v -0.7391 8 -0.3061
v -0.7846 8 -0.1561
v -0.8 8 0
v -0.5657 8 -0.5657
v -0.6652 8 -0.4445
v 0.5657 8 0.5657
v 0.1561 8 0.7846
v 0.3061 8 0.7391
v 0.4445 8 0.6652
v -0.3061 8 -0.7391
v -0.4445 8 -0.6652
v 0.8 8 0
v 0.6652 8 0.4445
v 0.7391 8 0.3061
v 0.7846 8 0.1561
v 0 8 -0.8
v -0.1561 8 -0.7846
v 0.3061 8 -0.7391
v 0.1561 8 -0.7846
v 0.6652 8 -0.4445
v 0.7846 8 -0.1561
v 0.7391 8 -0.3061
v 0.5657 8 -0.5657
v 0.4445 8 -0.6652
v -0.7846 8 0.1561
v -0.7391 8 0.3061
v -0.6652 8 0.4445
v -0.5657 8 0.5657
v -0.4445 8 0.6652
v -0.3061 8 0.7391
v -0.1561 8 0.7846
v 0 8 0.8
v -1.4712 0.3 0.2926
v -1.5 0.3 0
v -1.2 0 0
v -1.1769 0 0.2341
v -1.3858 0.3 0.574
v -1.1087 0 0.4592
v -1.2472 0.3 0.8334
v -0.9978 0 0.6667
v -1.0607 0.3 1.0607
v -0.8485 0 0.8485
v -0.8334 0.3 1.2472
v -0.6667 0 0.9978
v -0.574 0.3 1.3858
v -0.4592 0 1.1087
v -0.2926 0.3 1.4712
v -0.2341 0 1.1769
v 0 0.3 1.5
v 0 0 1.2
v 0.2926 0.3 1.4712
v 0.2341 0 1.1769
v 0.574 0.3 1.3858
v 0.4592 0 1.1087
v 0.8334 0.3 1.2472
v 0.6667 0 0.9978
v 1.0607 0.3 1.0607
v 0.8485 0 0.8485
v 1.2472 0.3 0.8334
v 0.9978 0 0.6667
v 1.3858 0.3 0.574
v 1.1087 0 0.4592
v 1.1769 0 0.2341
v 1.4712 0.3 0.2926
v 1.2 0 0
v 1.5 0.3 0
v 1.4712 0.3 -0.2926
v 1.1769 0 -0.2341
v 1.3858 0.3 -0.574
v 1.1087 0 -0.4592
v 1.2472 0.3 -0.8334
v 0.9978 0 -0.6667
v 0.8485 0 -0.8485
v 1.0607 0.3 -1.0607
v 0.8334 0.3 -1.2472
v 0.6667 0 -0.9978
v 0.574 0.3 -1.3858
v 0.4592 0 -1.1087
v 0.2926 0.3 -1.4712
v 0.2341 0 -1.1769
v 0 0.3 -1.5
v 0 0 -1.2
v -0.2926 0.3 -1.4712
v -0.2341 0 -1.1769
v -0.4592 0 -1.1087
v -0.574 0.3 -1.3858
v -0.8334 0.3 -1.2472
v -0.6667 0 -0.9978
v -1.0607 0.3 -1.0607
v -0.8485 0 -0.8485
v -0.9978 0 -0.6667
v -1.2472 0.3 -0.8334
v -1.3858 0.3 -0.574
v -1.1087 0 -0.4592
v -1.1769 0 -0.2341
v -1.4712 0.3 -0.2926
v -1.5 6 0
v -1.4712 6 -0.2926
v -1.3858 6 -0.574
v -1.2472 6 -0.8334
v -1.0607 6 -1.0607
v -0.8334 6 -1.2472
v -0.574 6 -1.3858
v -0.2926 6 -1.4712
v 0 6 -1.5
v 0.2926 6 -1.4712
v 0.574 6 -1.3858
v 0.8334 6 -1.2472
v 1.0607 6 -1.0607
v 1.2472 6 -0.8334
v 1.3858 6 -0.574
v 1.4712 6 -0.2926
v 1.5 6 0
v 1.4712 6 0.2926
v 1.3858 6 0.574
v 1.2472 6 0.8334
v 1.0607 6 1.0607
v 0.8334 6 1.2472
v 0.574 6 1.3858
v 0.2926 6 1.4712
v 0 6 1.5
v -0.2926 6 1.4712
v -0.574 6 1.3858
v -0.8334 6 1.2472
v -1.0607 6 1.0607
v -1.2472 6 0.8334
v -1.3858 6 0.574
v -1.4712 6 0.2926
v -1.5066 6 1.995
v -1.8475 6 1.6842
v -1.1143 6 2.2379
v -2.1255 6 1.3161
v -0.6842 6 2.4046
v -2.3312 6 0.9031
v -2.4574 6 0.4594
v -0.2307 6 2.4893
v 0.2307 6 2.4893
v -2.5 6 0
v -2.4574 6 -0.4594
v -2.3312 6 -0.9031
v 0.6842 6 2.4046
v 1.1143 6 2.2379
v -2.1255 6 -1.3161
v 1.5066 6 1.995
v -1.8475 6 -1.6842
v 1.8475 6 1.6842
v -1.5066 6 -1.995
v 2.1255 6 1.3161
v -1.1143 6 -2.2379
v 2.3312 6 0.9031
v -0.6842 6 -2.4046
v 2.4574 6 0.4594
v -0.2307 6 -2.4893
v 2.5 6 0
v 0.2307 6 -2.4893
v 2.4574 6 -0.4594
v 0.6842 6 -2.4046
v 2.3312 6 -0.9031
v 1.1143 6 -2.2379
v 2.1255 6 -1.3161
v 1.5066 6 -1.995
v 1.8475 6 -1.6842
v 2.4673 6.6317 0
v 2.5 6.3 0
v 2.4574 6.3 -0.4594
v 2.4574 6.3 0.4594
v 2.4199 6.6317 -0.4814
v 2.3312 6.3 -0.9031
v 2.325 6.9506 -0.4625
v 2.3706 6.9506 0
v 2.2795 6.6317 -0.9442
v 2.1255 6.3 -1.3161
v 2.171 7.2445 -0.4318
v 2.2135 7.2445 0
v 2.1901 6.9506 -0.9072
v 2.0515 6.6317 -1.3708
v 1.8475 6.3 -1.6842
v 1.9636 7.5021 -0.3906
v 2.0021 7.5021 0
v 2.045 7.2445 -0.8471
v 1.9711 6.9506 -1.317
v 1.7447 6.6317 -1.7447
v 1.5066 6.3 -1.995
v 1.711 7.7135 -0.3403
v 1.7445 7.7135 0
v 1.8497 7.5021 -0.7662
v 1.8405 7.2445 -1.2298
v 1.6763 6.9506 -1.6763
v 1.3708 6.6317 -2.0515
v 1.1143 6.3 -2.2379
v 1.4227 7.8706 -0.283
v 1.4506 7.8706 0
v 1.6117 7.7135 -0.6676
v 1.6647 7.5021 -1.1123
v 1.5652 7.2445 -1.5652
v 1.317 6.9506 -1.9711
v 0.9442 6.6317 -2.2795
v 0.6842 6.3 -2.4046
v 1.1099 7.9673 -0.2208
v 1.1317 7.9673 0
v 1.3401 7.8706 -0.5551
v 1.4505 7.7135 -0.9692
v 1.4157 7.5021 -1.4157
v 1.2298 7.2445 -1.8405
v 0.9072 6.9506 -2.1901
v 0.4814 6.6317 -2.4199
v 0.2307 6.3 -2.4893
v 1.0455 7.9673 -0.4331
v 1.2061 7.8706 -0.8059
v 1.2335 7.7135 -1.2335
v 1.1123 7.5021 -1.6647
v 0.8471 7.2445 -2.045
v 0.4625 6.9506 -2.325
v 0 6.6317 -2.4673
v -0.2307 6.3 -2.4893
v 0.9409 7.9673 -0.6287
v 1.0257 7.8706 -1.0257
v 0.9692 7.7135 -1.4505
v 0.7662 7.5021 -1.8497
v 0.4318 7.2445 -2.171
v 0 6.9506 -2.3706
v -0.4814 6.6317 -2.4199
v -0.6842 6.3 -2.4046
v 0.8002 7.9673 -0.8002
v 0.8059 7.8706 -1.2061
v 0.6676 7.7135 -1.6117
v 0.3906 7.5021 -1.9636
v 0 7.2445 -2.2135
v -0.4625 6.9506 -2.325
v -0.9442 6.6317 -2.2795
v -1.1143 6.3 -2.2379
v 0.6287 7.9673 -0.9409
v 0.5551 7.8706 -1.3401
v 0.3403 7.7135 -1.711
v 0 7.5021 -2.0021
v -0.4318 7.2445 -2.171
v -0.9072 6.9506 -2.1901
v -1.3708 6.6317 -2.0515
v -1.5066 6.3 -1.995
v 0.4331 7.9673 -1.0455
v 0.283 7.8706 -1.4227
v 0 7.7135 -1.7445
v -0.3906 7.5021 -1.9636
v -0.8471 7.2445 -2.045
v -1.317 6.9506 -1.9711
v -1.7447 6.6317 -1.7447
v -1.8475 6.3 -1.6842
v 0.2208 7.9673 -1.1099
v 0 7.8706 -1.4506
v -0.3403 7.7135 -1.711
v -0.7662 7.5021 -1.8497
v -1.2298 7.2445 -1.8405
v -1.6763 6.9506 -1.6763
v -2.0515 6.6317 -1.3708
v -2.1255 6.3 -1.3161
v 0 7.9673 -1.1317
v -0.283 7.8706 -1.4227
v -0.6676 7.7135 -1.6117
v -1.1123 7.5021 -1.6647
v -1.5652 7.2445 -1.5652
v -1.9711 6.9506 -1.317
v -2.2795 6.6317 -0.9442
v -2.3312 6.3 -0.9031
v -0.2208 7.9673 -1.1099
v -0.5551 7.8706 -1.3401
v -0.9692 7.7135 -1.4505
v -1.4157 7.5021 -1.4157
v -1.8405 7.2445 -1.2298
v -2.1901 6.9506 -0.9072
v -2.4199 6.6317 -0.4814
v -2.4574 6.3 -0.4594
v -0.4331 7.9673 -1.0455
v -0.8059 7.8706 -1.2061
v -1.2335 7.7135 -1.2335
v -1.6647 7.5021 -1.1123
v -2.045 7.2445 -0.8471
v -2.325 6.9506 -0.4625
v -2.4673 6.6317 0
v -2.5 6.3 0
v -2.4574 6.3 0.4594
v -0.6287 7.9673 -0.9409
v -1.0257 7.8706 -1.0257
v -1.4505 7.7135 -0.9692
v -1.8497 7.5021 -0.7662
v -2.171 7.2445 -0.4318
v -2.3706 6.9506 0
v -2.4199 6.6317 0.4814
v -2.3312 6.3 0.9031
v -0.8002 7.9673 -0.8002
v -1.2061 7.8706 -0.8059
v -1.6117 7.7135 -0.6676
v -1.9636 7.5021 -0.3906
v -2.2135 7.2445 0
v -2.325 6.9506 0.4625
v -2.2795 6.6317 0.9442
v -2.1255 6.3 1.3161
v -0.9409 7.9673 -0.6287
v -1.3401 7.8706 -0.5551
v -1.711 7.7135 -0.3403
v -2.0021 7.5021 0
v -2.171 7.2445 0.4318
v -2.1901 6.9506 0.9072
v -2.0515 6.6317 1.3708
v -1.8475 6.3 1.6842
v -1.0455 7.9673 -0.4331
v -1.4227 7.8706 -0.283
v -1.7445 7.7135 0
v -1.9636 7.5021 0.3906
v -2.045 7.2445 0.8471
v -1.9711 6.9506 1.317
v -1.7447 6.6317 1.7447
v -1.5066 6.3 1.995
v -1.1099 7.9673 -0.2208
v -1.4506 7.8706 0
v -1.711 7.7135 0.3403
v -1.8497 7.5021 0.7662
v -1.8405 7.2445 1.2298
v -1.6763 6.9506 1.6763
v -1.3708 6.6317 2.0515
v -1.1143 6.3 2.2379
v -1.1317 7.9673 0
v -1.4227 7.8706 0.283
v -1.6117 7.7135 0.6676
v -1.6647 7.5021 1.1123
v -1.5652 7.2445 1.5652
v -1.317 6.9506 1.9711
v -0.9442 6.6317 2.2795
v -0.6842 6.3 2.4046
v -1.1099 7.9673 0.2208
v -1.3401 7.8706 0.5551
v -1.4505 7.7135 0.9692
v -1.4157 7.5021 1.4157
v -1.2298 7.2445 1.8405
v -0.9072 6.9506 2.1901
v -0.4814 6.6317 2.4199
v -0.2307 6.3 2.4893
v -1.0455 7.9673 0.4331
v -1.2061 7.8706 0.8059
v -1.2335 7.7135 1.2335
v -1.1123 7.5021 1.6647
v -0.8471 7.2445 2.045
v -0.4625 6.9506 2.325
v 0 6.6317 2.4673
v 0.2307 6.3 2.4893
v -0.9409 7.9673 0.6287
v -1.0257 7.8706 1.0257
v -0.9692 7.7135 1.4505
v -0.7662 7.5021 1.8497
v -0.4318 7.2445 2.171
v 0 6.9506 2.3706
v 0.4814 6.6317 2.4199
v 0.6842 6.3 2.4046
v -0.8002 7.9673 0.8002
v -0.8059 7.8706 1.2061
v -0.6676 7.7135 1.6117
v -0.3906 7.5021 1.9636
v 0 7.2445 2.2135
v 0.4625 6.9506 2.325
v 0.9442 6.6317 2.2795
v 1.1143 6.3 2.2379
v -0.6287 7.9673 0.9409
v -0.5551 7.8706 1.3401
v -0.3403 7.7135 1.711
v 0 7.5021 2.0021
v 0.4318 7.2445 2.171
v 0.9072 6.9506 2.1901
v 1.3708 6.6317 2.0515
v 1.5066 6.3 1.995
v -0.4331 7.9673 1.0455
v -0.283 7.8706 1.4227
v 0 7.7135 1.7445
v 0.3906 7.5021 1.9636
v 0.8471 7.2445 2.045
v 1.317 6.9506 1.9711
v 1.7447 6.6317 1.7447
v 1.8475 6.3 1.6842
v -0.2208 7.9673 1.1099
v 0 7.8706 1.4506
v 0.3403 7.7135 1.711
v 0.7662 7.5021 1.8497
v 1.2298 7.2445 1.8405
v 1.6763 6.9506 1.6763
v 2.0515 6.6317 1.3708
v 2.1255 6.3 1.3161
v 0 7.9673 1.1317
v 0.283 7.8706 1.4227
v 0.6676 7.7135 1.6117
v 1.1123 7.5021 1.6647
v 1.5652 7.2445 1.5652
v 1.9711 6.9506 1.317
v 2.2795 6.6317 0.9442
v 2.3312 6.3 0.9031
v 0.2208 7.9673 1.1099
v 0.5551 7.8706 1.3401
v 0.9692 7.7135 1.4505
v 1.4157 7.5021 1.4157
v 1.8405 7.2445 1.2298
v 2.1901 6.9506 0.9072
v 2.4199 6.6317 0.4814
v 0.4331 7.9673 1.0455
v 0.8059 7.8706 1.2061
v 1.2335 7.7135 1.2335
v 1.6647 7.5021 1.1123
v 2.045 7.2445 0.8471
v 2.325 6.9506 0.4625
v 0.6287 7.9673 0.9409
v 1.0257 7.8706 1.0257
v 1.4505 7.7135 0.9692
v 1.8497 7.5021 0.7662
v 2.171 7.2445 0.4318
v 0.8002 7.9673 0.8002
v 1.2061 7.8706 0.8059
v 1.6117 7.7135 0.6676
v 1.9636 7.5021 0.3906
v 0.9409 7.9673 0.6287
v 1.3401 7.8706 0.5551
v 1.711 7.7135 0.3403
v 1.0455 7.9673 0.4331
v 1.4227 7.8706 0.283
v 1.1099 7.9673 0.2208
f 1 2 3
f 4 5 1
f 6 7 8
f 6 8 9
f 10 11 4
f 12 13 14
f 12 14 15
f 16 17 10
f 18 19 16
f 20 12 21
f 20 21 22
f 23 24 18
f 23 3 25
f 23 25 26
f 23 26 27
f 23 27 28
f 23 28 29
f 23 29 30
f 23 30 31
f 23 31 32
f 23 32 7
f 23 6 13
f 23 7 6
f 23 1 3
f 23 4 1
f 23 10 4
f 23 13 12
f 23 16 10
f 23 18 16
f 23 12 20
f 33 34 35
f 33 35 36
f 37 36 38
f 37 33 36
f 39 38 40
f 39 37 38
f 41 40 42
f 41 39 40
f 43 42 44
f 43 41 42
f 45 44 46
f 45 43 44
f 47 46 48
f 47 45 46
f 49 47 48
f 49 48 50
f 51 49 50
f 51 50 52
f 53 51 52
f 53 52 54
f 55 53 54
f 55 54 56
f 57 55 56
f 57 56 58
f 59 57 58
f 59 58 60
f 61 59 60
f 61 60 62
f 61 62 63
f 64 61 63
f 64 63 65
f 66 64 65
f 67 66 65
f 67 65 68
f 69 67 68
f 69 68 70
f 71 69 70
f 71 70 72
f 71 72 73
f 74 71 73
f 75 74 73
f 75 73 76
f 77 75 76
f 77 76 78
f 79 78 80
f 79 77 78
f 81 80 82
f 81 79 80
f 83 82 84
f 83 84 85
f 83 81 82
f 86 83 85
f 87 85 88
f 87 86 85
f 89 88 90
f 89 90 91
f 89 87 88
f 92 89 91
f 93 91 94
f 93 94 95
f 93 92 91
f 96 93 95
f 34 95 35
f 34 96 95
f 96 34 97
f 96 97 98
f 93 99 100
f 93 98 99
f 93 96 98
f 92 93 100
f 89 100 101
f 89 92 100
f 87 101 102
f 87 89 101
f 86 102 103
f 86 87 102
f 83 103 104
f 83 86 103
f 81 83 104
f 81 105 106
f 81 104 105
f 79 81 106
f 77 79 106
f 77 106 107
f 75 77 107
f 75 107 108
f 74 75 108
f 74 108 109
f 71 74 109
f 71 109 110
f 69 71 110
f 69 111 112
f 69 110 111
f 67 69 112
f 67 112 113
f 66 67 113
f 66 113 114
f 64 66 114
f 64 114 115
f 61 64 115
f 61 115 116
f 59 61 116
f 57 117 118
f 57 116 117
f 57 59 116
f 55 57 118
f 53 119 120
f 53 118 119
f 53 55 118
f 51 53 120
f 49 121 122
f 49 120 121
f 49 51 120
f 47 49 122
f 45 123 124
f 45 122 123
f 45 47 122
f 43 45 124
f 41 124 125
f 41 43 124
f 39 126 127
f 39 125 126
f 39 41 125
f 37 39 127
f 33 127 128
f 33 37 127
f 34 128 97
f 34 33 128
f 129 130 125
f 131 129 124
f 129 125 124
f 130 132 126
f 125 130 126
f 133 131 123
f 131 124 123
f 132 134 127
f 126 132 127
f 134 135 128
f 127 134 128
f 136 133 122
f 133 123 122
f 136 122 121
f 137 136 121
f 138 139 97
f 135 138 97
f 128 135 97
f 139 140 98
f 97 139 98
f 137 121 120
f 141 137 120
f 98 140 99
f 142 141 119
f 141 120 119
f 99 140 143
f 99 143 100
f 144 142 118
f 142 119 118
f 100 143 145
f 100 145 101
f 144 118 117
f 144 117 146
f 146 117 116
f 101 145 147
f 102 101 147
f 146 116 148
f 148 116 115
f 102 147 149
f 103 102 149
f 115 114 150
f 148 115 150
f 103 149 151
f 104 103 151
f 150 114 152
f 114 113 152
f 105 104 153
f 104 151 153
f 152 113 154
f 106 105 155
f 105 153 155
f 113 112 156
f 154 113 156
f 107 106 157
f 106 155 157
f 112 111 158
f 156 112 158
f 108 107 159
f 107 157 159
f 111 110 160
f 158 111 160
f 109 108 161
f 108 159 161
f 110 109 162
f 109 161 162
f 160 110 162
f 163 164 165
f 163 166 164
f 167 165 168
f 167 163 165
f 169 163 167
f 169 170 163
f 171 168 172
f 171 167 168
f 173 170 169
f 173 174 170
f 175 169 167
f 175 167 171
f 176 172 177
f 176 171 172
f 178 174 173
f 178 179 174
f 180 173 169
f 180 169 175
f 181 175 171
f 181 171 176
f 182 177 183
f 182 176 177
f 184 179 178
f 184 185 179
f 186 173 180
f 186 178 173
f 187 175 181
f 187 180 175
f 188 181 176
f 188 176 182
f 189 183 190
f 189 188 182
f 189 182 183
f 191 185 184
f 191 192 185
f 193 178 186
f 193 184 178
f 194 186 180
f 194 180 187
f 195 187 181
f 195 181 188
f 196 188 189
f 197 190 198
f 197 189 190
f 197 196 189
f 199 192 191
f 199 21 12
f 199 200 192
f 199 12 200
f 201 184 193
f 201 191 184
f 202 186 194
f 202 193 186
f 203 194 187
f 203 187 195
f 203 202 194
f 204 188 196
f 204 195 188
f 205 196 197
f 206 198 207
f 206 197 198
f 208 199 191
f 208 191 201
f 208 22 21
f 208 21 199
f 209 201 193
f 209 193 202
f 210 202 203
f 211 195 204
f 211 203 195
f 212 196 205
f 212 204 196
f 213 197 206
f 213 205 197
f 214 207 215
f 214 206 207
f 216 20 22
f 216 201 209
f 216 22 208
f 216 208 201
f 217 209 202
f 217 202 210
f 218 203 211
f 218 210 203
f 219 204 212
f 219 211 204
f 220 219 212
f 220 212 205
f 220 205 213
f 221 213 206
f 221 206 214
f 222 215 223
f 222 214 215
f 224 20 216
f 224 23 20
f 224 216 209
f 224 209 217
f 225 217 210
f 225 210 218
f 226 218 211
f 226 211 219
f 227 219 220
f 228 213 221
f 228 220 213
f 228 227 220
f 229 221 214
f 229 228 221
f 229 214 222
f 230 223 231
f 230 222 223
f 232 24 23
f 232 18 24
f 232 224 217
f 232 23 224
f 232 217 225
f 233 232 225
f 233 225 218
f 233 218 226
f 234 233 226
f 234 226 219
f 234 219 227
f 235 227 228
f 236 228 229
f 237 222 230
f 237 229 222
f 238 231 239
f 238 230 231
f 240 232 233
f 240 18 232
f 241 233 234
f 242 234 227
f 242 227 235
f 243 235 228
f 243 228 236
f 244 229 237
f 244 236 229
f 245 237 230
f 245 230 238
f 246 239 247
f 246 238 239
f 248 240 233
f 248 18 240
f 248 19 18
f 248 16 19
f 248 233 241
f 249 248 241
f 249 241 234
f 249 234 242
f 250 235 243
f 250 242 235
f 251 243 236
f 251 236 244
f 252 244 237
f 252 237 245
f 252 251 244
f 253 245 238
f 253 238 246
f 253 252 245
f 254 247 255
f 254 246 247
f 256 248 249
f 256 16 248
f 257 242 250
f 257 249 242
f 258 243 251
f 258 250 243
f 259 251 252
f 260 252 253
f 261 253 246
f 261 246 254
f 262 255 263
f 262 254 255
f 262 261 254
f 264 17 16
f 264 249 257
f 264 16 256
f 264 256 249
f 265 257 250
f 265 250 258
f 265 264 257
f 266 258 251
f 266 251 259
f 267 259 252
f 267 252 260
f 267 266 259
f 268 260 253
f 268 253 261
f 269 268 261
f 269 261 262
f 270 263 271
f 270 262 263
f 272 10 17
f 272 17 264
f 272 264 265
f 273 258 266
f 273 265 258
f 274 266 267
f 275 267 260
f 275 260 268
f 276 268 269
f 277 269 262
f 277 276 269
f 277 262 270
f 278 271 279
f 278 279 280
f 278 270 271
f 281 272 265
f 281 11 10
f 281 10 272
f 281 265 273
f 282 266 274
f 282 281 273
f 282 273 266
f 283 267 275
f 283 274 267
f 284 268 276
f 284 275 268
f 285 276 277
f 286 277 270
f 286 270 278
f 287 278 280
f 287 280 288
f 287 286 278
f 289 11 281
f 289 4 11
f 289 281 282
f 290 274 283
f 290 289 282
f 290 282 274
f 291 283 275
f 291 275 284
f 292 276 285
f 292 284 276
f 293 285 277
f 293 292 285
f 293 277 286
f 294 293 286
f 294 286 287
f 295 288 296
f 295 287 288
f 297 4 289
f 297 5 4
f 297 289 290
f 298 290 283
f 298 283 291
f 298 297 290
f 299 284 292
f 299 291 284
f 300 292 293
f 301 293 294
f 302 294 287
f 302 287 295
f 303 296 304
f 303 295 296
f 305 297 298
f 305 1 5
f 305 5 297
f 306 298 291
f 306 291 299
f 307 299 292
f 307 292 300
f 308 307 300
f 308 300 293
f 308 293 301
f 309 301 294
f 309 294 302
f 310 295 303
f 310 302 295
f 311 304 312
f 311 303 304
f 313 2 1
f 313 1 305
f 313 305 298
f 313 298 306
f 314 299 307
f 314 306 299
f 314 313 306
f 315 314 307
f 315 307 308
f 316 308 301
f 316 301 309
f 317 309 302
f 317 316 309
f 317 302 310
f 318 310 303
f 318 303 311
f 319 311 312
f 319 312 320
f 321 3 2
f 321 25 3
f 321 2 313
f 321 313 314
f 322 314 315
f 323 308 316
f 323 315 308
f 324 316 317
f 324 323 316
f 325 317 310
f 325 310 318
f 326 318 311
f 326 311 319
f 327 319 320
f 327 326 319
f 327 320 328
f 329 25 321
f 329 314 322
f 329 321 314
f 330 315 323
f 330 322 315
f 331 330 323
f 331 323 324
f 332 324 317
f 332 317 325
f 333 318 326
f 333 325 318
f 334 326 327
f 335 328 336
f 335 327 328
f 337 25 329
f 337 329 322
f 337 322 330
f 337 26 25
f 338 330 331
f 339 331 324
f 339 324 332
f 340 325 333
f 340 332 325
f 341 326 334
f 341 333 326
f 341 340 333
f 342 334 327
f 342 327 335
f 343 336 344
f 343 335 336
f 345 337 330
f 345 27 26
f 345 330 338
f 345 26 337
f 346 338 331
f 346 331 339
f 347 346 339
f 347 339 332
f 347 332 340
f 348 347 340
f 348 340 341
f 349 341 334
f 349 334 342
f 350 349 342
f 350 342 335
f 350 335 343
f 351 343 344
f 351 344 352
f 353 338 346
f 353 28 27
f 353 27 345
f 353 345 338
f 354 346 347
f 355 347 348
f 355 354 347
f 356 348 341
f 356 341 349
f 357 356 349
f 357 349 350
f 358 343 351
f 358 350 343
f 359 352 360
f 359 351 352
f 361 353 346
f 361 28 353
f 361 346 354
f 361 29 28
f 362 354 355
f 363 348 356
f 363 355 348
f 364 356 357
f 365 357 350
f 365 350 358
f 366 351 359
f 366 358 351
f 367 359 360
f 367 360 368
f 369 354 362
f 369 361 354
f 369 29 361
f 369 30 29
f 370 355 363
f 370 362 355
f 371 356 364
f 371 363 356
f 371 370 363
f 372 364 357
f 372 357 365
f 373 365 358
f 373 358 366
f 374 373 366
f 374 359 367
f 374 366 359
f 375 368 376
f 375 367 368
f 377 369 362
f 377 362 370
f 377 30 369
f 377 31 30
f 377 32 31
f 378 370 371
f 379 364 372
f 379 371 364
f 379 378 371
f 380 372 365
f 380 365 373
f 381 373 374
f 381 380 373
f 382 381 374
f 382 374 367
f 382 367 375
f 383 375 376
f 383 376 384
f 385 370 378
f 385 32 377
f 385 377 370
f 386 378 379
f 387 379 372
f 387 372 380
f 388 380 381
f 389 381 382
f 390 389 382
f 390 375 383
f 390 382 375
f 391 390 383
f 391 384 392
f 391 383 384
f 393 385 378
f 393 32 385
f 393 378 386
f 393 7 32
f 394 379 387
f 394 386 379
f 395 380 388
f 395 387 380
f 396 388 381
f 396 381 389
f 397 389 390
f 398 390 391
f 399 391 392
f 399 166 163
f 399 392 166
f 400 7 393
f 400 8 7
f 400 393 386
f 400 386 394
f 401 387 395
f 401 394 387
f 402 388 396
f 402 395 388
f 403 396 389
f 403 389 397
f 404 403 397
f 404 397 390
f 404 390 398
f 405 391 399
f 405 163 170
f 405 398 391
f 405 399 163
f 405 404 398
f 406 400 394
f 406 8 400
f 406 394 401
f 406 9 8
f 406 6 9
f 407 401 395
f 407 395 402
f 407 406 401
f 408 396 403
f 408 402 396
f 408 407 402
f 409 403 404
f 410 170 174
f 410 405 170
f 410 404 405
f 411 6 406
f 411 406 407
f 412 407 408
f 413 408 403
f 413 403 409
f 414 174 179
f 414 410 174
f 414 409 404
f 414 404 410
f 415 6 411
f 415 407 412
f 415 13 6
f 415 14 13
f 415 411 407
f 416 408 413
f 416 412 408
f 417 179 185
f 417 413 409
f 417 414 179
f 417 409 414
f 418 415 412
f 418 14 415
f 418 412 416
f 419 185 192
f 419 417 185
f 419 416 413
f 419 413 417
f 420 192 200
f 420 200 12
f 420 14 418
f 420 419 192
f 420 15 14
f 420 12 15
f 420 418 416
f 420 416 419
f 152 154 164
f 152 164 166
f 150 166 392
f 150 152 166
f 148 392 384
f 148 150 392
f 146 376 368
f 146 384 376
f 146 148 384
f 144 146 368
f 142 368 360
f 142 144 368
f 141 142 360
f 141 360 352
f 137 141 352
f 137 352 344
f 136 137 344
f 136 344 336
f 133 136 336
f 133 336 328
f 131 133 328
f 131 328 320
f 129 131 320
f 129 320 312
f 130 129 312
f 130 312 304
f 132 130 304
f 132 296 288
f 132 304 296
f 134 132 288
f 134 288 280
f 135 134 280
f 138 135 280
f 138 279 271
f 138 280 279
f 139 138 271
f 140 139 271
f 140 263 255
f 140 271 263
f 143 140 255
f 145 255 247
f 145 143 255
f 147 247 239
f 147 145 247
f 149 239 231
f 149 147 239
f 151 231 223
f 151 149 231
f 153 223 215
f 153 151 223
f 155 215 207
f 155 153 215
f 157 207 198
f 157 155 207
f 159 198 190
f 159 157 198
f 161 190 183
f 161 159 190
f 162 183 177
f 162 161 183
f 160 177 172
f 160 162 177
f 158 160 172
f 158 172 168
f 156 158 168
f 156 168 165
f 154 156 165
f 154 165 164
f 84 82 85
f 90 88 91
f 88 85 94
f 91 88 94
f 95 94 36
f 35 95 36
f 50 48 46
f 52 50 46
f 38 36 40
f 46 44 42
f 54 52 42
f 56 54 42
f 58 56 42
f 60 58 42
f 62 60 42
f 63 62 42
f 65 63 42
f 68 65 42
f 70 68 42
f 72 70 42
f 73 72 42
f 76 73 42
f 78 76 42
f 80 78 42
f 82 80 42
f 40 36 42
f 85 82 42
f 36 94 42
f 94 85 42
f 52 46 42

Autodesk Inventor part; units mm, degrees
ref_plane "YZ Plane" through (0, 0, 0) normal (1, 0, 0) x (0, 1, 0)
ref_plane "XZ Plane" through (0, 0, 0) normal (0, 1, 0) x (-1, 0, 0)
ref_plane "XY Plane" through (0, 0, 0) normal (0, 0, 1) x (1, 0, 0)
sketch "Sketch1" plane through (0, 0, 0) normal (0, 1, 0) x (-1, 0, 0)
  circle A0 centre (0, 0) radius 1.5
  dimension "d0" = 3
extrude "Extrusion1" add sketch "Sketch1" along normal blind 6
sketch "Sketch2" plane through (0, 6, 0) normal (0, 1, 0) x (1, 0, 0)
  circle A0 centre (0, 0) radius 2.5
  dimension "d3" = 5
extrude "Extrusion2" add sketch "Sketch2" along normal blind 2
fillet "Fillet1" radius 1.7 1 edges at (-2.5, 8, 0)
chamfer "Chamfer1" distance 0.3 angle 45 1 edges at (1.5, 0, 0)
thread "Thread1" size "M3x0.5" class "6g" standard "ANSI Metric M Profile" full length
properties part number "M3x6 Screw Nylon" material "Nylon 6"
